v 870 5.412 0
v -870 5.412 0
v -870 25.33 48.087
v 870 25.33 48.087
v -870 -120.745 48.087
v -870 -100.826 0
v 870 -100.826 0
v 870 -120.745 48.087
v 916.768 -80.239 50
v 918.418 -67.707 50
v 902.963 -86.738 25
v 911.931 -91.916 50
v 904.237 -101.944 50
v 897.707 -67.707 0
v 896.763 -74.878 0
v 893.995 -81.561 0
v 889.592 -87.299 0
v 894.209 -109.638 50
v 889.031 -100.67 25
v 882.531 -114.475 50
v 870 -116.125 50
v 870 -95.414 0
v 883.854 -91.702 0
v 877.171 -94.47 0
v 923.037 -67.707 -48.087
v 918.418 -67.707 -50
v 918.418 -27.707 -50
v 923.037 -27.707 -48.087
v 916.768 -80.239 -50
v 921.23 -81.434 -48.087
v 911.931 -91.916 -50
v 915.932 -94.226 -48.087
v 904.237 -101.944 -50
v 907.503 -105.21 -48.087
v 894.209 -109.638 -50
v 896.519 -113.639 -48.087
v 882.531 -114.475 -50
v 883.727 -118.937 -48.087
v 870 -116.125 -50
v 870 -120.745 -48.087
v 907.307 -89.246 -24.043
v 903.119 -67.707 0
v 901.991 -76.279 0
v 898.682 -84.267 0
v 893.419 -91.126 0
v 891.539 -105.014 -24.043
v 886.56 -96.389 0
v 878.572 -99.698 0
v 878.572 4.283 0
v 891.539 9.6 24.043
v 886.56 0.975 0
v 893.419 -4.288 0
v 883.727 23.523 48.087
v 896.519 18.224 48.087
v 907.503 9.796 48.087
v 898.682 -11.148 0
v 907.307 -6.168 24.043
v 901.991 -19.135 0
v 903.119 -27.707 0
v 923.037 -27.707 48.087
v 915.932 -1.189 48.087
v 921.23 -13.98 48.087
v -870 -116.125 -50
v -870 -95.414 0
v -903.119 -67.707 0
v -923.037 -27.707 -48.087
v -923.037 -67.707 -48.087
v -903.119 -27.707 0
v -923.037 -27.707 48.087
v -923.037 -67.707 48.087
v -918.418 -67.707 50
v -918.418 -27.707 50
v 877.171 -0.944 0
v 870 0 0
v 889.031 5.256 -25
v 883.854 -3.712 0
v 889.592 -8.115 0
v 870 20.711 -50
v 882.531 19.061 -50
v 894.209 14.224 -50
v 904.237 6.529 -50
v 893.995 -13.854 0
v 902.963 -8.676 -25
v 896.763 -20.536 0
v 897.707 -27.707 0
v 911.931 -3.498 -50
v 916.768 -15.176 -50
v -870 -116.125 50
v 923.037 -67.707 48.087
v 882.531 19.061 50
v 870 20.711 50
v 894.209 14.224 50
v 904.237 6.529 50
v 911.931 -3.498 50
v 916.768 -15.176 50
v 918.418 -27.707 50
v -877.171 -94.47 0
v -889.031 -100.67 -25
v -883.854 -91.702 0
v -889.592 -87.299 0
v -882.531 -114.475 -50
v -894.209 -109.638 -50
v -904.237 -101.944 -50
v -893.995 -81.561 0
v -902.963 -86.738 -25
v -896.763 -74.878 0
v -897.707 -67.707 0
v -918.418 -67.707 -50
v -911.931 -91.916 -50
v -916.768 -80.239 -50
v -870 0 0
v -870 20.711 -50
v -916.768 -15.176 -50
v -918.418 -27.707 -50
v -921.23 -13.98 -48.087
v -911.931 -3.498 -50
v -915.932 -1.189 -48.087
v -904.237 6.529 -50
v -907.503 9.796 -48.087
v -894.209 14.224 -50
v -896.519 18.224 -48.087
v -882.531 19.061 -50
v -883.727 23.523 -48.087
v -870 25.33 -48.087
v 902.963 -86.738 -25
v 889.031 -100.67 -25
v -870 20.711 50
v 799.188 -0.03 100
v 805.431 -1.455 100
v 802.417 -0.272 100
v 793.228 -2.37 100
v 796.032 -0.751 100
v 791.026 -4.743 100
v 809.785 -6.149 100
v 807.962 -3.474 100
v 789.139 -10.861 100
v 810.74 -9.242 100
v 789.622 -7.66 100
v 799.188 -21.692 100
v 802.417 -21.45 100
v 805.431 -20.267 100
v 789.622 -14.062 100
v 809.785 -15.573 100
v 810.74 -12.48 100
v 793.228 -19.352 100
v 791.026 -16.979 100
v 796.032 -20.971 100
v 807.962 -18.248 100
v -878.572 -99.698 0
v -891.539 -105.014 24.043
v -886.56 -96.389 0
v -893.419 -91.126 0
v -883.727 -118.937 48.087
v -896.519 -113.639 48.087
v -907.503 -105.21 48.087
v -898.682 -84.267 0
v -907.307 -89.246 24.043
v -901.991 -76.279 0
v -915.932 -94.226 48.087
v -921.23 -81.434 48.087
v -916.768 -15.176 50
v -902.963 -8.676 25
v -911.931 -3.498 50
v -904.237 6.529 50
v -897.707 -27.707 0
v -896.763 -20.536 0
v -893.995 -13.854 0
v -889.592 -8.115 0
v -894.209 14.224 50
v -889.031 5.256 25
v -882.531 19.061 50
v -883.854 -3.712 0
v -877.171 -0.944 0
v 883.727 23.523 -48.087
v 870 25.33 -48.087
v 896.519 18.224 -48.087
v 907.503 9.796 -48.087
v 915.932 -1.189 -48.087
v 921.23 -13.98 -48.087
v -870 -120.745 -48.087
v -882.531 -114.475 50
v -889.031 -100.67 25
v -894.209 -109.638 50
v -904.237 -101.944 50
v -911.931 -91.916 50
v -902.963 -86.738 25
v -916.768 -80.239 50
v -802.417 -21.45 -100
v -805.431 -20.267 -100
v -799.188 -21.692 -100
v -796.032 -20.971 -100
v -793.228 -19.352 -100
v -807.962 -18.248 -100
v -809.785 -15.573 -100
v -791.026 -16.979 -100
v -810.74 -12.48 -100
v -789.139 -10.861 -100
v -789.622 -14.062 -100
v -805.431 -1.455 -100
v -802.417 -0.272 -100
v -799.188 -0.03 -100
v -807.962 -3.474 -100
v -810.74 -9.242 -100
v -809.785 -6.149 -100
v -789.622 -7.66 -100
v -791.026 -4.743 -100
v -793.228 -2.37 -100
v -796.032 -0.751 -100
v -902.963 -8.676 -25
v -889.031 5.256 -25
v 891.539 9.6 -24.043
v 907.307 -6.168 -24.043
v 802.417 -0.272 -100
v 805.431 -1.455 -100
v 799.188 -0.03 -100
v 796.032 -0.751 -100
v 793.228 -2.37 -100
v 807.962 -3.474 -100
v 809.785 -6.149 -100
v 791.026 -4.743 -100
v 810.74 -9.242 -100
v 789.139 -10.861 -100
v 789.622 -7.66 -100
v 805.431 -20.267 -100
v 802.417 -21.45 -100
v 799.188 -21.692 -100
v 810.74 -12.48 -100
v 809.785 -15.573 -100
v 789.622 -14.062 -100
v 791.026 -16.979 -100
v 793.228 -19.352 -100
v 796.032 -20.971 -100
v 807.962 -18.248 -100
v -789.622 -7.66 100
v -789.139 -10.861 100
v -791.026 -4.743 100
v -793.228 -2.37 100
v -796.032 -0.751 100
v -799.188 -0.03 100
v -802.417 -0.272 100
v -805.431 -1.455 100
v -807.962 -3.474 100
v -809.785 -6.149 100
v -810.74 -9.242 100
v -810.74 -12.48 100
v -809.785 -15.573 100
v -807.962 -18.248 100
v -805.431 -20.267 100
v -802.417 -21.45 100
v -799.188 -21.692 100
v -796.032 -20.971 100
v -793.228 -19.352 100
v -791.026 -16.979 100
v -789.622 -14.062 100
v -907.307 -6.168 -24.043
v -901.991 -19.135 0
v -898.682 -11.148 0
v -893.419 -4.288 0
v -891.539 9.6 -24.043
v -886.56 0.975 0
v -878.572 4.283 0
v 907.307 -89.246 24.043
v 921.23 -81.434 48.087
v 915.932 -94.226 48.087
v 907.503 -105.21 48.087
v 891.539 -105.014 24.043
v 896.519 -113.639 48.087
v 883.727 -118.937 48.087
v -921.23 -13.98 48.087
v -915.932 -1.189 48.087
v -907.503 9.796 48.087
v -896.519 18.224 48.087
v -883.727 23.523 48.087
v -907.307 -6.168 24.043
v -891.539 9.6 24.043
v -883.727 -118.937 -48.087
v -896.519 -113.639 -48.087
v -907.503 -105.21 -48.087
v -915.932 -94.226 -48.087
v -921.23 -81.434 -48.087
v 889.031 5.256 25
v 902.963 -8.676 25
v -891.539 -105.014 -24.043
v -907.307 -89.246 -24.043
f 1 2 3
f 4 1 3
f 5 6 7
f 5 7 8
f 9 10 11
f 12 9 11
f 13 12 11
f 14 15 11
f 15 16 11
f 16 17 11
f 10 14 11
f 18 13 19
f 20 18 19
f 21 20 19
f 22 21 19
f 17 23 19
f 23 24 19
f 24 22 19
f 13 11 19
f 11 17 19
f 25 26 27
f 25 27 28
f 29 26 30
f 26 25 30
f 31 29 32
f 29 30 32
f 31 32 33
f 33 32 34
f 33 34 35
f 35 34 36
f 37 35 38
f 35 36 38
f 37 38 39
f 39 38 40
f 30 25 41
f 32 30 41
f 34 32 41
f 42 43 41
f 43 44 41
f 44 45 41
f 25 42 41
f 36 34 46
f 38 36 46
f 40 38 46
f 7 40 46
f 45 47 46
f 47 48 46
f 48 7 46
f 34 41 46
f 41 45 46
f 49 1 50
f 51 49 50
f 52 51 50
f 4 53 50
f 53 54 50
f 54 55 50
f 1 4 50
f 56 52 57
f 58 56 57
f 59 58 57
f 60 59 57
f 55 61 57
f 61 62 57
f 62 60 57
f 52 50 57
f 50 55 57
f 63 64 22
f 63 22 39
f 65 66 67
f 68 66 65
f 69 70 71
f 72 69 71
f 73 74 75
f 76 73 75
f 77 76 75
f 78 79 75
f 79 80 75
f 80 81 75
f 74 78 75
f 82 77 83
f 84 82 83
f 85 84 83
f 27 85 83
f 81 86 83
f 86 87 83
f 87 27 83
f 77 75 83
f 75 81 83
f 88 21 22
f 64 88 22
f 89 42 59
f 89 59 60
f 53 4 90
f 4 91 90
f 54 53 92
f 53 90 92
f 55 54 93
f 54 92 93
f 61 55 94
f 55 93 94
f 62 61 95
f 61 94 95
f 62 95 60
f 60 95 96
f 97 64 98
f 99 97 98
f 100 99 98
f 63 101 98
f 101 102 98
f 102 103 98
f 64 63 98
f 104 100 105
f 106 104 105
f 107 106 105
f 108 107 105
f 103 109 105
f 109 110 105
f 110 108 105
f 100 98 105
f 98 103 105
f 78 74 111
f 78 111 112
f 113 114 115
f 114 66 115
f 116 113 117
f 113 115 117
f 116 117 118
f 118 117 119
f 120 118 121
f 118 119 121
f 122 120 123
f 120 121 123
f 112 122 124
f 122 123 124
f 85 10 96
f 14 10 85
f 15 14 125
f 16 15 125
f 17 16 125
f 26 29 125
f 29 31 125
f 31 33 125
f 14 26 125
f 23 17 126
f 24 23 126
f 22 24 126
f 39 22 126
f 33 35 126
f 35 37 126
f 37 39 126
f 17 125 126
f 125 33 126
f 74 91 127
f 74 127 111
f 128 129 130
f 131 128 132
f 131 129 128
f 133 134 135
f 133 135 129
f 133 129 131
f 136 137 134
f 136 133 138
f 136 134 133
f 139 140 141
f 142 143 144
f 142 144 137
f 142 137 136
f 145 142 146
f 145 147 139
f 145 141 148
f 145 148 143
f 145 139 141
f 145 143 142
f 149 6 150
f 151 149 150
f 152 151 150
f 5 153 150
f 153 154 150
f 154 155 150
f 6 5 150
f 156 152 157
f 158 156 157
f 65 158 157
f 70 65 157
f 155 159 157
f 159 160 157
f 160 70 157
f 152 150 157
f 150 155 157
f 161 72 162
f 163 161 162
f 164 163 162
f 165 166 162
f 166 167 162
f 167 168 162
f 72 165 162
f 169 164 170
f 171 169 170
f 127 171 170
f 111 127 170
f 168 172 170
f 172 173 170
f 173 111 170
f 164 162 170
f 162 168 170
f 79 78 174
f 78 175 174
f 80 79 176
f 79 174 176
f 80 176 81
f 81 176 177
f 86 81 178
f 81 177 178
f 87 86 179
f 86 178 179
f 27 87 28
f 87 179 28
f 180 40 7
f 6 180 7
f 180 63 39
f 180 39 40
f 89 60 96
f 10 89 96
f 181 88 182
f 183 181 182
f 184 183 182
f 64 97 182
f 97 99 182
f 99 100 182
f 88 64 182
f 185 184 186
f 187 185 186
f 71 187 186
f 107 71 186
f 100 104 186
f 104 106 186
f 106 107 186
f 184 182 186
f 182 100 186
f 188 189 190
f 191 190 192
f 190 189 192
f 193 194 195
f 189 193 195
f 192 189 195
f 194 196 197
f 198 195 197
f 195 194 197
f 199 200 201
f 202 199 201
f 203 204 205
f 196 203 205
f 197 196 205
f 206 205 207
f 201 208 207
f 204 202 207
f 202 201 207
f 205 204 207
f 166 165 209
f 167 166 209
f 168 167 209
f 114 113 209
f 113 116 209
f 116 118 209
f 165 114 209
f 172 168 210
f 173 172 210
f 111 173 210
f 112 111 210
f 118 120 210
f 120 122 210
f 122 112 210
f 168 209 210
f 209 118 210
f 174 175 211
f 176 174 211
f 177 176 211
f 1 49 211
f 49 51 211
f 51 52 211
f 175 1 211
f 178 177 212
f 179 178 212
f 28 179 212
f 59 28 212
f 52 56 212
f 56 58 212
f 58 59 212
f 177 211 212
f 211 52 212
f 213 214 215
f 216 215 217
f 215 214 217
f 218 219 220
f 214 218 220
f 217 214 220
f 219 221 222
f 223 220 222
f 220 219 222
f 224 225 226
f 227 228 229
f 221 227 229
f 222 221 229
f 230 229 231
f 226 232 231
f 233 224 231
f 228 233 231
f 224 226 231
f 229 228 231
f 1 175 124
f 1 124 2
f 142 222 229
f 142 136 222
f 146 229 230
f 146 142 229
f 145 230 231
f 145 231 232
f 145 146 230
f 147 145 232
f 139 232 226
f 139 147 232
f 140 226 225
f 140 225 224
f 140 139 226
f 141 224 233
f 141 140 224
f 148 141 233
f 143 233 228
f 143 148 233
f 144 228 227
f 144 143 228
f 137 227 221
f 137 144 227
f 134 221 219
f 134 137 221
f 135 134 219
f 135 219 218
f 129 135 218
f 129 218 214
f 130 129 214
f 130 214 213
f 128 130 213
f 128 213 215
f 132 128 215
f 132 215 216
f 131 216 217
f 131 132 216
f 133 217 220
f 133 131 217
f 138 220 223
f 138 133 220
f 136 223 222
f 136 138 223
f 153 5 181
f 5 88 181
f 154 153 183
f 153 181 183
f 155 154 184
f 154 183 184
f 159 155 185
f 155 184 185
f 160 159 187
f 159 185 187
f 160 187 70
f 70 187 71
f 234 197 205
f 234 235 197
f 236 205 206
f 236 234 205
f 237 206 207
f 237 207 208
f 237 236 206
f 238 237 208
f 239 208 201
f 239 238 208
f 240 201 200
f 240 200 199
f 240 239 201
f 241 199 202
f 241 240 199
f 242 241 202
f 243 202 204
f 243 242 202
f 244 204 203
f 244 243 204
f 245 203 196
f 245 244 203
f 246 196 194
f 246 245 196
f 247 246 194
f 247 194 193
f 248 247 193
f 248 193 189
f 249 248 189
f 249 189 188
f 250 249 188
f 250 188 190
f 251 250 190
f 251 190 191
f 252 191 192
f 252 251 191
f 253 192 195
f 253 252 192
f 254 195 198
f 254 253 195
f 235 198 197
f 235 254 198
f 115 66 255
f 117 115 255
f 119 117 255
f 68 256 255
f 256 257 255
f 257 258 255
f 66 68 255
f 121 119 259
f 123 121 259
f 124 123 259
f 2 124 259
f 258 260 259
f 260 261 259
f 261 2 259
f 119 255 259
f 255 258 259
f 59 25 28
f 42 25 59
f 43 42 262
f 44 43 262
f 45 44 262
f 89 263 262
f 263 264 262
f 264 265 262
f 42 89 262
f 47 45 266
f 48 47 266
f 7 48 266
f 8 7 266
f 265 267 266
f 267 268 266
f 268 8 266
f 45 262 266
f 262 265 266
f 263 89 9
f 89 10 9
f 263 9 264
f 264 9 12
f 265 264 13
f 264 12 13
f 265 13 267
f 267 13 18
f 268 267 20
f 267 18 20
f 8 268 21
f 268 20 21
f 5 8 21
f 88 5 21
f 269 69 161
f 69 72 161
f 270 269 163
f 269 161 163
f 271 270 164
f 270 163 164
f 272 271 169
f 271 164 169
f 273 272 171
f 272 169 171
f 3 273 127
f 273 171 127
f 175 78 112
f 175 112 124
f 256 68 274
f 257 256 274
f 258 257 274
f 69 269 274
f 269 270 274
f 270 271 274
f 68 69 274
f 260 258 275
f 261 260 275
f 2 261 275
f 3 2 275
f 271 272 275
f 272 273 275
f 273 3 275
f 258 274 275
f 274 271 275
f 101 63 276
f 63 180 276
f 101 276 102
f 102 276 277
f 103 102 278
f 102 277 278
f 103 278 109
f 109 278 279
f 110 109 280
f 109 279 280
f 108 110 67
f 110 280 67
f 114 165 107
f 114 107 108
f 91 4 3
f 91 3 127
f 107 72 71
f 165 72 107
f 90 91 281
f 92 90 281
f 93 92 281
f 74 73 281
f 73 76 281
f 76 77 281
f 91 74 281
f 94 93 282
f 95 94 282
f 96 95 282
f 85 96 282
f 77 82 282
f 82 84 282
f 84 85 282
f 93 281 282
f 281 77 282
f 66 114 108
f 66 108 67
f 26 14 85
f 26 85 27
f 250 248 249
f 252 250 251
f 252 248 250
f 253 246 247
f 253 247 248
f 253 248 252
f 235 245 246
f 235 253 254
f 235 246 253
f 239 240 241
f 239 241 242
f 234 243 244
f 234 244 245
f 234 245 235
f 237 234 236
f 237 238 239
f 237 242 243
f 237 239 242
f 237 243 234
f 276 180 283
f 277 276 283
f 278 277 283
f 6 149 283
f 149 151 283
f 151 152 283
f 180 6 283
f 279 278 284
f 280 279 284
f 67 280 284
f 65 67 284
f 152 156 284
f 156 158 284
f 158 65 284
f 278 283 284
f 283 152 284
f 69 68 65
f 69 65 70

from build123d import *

# Parameters (mm, degrees)
CROQUIS61_R               = 10.861013232
SALIENTE_EXTRUIR2_DEPTH   = 100
SALIENTE_EXTRUIR2_2_DEPTH = 100


with BuildPart() as part:
    # Barrer8: sweep along a path in Croquis59
    with BuildLine(Plane.XY) as barrer8_path:
        Line((-870, 2.292783659), (870, 2.292783659))
        ThreePointArc((870, 2.292783659), (891.213203436, -6.494012905), (900, -27.707216341))
        Line((900, -27.707216341), (900, -67.707216341))
        ThreePointArc((900, -67.707216341), (891.213203436, -88.920419776), (870, -97.707216341))
        Line((870, -97.707216341), (-870, -97.707216341))
        ThreePointArc((-870, -97.707216341), (-891.213203436, -88.920419776), (-900, -67.707216341))
        Line((-900, -67.707216341), (-900, -27.707216341))
        ThreePointArc((-900, -27.707216341), (-891.213203436, -6.494012905), (-870, 2.292783659))
    # Croquis58 → Barrer8 (sweep)
    with BuildSketch(Plane(origin=(0, 0, 0), x_dir=(0, 0, -1), z_dir=(1, 0, 0))):
        Polygon((0, 0), (-50, 20.710678119), (-48.086582838, 25.330075781), (0, 5.411961001), (48.086582838, 25.330075781), (50, 20.710678119), align=None)
    sweep(path=barrer8_path.line)


with BuildPart() as body_2:
    # Croquis61 → Saliente-Extruir2 (new, symmetric)
    with BuildSketch(Plane.XY):
        with Locations((-800, -10.861013232)):
            Circle(CROQUIS61_R)
    extrude(amount=SALIENTE_EXTRUIR2_DEPTH, both=True)


with BuildPart() as body_3:
    # Croquis61 → Saliente-Extruir2 2 (new, symmetric)
    with BuildSketch(Plane.XY):
        with Locations(Location((800, -10.861013232, 0), (0, 0, 180))):
            Circle(CROQUIS61_R)
    extrude(amount=SALIENTE_EXTRUIR2_2_DEPTH, both=True)


solid = Compound([part.part, body_2.part, body_3.part])
